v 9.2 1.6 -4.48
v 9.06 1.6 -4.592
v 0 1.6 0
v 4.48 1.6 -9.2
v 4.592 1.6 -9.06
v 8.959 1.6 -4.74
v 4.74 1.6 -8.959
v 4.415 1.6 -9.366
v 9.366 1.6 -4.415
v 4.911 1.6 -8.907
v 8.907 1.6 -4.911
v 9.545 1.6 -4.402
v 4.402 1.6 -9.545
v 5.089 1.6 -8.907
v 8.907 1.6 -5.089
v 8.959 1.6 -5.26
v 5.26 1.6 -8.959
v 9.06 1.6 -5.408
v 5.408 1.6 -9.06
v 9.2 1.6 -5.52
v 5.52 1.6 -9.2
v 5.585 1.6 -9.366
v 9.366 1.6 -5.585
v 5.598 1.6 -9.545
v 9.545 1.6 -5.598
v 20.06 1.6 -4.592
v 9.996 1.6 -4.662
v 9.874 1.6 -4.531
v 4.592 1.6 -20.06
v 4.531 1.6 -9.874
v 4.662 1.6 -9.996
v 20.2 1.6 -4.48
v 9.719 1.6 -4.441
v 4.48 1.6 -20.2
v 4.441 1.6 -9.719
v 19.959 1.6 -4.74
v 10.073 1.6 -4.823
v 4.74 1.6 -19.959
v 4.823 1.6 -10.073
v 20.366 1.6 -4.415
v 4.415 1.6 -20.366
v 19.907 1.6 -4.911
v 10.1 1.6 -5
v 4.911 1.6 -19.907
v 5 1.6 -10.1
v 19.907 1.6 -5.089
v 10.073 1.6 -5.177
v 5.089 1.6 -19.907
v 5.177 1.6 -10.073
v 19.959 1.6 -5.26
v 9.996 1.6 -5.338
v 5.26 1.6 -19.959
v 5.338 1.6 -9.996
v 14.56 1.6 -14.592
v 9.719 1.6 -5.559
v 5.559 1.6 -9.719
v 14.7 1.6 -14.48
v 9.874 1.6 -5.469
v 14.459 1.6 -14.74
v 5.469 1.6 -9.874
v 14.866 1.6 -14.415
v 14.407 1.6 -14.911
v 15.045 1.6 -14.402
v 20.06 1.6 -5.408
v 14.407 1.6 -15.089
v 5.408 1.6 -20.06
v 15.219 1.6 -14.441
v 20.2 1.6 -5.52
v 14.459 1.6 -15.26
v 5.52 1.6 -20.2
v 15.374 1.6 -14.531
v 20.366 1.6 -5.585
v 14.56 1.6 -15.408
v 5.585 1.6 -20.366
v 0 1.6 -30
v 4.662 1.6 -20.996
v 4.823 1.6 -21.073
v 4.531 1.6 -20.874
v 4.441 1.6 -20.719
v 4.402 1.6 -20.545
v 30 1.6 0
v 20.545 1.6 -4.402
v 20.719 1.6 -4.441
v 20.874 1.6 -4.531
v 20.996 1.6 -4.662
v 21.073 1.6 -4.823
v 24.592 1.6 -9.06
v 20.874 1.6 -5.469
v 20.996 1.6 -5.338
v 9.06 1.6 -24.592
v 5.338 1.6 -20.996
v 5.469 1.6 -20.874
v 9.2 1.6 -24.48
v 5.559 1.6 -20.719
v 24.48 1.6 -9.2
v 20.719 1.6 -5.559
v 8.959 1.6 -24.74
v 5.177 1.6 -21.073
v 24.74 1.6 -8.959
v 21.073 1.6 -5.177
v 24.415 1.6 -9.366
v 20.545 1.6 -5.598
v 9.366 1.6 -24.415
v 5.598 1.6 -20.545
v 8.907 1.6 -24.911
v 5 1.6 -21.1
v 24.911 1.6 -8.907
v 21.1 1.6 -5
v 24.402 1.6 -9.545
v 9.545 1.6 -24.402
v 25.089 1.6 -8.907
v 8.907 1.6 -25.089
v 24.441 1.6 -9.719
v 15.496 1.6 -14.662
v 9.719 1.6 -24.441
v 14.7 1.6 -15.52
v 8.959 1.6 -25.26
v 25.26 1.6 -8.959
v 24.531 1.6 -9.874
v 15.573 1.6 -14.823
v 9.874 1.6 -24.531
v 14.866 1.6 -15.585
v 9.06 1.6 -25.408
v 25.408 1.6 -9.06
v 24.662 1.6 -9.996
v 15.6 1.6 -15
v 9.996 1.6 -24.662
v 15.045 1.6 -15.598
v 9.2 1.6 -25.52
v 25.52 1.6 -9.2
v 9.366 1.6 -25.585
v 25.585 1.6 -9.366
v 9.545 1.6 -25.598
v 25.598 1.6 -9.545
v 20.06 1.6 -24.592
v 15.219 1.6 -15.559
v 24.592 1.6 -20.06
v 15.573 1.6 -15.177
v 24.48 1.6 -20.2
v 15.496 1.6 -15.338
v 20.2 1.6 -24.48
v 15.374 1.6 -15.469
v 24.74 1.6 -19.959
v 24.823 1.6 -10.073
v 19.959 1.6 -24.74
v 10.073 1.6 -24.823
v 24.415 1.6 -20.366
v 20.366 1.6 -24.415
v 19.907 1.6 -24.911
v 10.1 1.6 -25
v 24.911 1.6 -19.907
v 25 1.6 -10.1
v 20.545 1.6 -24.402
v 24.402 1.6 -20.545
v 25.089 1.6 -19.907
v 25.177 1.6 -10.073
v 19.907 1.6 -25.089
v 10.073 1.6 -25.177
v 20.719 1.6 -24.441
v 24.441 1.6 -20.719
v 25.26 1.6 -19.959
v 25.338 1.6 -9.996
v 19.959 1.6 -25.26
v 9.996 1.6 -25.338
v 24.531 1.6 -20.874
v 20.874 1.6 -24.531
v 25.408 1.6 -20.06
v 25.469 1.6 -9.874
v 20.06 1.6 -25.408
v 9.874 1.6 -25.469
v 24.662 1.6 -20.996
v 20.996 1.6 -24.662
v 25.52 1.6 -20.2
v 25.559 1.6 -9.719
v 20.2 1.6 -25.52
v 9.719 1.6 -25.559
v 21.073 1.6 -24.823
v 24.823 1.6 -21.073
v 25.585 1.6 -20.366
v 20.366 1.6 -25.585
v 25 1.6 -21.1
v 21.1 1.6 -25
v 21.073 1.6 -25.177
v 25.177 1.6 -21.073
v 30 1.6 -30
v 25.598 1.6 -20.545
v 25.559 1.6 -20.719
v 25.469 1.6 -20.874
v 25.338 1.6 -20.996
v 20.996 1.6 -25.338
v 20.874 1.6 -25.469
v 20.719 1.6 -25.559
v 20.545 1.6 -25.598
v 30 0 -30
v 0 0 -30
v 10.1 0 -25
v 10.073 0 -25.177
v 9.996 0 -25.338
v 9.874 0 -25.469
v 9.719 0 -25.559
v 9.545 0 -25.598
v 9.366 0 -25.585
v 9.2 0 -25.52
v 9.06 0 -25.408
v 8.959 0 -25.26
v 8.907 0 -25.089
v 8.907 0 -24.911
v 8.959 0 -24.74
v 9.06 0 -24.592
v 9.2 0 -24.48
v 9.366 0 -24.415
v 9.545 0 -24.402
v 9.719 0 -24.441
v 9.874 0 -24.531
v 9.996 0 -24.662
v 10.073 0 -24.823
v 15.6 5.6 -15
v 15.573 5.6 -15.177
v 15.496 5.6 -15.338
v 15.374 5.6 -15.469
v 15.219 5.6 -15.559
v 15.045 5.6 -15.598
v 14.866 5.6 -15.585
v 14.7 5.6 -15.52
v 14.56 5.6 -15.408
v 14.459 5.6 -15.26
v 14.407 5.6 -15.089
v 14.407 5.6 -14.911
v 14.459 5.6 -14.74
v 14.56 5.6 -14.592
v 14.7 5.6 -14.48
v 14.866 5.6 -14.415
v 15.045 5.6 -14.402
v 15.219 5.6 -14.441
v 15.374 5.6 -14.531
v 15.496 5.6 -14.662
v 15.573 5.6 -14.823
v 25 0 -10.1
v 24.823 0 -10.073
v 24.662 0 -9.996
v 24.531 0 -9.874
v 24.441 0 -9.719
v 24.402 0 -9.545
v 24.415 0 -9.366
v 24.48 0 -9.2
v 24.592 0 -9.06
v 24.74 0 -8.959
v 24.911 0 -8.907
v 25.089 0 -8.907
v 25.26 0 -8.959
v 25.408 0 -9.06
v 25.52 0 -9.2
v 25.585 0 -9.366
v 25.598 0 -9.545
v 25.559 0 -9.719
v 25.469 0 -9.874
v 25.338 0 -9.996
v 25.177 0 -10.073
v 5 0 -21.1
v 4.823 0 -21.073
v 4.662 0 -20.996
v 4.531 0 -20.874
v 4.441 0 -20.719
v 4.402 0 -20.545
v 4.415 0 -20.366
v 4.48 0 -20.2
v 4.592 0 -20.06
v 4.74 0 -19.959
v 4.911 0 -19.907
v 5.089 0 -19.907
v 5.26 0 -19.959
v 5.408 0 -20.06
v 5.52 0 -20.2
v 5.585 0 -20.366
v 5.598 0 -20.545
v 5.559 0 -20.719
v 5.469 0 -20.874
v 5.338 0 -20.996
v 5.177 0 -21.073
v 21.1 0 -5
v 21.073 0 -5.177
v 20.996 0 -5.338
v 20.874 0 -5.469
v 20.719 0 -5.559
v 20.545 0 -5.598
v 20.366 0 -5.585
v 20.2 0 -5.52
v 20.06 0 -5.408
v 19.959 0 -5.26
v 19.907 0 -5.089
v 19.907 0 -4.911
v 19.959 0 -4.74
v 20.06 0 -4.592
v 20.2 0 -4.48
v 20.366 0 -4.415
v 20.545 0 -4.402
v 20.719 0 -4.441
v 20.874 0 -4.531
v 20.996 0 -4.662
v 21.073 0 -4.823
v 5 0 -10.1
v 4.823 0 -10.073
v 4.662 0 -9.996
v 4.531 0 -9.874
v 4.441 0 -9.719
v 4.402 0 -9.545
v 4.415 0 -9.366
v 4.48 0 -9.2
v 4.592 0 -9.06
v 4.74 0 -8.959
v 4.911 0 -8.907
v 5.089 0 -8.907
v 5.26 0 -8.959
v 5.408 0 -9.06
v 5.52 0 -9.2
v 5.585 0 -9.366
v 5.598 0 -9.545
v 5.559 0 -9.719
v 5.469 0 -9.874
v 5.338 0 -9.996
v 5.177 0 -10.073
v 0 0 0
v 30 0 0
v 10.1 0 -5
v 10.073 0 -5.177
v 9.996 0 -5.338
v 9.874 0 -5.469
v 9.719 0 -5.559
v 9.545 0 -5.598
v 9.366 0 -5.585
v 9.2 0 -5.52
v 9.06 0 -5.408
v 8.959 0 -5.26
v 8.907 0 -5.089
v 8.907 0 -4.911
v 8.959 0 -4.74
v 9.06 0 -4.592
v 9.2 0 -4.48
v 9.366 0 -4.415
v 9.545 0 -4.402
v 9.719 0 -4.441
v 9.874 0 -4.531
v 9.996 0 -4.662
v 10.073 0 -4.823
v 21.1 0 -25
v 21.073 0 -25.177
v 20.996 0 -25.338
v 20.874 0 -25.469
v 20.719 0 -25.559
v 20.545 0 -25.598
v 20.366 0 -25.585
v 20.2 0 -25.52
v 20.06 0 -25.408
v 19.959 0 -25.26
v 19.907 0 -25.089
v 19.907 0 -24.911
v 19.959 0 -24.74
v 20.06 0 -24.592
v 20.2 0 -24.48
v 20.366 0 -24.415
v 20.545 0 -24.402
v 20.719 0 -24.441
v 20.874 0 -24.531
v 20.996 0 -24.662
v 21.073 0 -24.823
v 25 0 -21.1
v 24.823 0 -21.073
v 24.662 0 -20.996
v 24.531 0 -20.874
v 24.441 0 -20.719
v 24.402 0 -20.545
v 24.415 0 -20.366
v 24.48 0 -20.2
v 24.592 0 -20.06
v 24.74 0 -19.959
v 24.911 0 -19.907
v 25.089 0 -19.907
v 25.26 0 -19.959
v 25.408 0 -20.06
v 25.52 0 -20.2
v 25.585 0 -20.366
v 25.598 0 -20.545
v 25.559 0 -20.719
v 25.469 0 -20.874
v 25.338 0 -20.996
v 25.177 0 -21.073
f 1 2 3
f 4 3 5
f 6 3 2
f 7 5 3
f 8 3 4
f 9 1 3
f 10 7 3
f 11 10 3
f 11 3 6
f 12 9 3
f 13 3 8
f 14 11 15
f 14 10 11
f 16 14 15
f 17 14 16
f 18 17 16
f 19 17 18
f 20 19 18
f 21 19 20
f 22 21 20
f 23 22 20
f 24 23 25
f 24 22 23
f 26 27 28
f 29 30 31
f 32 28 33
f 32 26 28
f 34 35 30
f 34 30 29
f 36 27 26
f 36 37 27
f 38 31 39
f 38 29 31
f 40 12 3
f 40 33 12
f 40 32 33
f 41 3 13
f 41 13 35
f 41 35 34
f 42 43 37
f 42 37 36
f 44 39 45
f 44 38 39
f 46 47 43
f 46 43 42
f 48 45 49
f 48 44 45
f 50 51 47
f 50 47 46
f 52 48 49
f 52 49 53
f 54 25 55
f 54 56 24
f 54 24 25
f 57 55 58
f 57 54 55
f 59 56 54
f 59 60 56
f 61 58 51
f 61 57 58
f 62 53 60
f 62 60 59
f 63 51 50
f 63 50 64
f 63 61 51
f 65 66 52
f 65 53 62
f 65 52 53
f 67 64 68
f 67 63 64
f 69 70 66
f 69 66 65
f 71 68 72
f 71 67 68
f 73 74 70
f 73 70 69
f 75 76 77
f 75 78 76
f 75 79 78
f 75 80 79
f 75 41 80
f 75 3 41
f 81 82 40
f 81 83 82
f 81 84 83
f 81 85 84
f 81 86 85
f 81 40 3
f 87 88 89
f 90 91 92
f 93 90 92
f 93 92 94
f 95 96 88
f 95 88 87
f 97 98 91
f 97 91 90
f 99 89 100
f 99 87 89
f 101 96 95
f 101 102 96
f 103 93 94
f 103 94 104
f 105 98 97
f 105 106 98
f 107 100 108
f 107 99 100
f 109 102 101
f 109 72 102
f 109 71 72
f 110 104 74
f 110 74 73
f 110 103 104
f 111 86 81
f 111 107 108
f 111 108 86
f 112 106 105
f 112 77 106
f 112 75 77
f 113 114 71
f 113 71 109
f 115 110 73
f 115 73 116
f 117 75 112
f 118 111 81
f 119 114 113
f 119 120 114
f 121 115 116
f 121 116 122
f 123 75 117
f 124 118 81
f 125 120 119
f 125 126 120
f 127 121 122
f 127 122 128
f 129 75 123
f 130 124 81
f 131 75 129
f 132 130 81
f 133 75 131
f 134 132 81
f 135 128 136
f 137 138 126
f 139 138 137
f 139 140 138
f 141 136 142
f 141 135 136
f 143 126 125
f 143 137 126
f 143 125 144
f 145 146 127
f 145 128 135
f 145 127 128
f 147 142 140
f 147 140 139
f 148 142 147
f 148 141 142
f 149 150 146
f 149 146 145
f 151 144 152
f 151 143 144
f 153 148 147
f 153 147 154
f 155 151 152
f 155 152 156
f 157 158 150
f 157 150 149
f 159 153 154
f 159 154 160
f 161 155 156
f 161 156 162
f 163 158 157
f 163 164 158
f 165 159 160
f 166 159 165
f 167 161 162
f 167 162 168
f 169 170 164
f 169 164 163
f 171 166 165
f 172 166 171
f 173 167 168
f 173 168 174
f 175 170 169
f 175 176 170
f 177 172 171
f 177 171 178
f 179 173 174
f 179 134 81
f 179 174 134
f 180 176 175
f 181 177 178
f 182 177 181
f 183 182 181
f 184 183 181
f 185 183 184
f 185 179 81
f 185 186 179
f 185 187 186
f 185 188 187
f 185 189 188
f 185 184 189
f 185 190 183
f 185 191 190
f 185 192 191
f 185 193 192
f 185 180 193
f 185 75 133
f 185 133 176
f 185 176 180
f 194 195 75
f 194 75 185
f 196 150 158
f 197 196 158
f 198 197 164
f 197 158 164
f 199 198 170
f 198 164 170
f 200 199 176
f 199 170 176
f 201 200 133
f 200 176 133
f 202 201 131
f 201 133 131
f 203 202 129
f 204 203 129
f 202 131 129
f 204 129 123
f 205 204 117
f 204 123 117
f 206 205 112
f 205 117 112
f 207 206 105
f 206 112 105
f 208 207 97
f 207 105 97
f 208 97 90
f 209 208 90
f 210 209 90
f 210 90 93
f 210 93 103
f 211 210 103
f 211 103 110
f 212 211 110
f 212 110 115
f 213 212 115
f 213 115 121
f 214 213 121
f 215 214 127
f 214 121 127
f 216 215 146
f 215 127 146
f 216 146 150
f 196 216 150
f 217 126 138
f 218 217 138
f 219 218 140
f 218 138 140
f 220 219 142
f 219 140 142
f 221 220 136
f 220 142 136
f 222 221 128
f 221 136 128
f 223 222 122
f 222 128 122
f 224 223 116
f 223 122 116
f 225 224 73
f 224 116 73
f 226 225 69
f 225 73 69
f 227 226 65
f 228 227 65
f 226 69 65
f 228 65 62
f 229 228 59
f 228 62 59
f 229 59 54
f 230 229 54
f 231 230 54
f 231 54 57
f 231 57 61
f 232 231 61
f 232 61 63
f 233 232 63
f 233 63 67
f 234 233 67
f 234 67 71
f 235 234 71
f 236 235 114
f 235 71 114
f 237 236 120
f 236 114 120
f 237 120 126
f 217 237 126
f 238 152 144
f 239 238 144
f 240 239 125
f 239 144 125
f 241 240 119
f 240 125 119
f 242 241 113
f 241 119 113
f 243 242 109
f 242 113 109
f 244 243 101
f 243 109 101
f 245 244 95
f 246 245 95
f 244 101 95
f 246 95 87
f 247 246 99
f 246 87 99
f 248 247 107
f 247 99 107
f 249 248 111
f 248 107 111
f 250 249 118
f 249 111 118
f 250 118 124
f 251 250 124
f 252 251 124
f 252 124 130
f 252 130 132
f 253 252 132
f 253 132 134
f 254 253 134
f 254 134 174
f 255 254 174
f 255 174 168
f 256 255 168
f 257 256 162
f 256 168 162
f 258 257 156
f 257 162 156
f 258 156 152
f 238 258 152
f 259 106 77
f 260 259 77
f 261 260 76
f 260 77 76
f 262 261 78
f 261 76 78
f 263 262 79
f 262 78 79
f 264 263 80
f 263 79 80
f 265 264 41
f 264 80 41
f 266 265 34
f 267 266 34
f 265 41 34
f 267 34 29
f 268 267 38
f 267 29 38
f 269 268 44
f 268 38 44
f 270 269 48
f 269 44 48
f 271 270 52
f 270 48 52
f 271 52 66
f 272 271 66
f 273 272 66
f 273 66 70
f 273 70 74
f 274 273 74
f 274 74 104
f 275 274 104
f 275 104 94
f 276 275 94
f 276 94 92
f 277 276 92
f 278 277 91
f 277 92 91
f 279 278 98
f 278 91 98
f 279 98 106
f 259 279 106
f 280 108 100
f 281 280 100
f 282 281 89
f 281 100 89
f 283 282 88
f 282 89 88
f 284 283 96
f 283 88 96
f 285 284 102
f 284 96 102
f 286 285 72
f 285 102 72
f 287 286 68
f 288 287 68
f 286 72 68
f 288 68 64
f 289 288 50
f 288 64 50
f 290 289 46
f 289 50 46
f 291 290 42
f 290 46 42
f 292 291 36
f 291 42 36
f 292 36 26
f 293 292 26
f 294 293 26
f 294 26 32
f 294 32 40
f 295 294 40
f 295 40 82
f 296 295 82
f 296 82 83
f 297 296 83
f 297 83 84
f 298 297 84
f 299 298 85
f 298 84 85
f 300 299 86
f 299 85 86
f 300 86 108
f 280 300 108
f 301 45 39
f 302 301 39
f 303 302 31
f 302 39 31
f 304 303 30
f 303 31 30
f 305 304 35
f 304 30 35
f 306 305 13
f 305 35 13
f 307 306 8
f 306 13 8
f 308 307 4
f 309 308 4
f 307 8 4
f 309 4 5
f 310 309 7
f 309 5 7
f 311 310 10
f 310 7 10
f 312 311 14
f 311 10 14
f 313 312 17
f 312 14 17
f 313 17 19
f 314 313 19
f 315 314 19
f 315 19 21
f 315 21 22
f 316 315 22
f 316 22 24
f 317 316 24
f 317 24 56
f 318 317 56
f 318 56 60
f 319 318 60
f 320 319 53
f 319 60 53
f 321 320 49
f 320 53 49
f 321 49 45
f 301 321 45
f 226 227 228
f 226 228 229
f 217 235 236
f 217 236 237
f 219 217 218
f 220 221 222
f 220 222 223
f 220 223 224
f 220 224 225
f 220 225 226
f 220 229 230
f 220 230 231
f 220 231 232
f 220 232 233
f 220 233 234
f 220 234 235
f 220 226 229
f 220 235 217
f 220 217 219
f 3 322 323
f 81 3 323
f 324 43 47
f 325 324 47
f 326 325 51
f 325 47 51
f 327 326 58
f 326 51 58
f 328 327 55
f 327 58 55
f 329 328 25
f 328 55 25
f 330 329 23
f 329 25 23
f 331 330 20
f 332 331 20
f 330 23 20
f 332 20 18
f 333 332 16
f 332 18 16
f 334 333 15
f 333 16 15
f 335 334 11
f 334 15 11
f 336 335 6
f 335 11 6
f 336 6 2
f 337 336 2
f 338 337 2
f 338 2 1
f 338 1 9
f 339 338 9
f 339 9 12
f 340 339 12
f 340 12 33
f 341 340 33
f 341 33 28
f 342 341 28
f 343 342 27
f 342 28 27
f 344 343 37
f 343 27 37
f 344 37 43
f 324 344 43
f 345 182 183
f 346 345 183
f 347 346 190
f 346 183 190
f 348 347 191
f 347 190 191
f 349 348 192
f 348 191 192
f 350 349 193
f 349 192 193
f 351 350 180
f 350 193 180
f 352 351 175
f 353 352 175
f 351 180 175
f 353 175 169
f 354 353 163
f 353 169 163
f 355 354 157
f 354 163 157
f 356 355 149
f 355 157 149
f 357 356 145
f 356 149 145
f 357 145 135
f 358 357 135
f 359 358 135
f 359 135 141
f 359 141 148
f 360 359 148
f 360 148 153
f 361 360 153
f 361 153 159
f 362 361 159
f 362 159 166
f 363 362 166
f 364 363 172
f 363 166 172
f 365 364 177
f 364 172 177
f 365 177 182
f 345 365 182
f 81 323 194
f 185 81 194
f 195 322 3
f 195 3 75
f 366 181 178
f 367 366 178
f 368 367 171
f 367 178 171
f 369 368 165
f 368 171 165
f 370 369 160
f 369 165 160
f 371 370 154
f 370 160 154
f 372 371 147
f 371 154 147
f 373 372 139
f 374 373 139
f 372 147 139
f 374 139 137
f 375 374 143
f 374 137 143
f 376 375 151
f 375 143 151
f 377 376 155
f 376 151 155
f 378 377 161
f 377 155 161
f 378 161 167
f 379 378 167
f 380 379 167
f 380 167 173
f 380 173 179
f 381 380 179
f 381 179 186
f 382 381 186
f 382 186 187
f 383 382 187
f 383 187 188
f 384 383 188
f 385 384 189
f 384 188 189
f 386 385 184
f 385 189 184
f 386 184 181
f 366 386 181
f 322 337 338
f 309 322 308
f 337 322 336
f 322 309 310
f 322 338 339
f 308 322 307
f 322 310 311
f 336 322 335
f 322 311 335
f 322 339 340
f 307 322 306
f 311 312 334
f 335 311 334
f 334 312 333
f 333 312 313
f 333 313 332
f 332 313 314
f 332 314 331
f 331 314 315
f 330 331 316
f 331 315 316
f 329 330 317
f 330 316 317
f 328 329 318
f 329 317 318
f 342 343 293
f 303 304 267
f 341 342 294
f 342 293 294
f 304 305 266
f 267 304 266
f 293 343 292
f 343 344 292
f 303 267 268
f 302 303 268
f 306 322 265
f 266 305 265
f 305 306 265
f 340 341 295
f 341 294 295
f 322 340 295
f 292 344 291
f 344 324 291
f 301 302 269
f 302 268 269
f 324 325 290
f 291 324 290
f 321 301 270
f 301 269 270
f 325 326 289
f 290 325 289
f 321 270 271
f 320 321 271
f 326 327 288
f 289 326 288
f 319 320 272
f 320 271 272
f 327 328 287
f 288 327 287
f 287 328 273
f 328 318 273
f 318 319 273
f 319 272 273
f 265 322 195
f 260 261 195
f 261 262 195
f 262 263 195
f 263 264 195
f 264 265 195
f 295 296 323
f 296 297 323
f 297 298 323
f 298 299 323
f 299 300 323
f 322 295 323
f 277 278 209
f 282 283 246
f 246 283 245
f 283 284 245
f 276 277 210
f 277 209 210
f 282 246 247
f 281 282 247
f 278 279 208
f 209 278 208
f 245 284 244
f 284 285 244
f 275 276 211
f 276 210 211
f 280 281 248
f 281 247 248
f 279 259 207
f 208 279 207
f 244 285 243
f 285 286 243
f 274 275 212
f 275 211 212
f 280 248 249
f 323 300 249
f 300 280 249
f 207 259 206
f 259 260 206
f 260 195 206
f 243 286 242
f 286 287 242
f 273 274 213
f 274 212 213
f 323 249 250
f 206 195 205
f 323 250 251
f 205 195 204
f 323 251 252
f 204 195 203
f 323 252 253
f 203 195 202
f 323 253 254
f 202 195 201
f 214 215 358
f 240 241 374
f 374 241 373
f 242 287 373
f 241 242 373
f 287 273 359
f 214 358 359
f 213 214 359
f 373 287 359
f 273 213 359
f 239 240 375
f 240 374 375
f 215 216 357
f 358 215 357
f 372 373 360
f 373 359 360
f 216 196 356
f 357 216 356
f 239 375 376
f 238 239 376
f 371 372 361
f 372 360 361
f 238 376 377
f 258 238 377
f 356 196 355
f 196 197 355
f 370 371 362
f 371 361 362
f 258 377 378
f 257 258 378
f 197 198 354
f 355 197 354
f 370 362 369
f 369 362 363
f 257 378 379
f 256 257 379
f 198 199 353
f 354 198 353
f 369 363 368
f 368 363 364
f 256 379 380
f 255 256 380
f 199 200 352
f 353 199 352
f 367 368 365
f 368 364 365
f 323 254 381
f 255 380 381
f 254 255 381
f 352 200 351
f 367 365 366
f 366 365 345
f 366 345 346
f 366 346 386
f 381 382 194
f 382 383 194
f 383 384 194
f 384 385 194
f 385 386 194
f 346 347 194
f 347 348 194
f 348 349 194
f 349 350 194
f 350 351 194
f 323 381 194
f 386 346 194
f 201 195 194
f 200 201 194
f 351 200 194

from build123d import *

# Parameters (mm, degrees)
SKETCH1_W           = 30
SKETCH1_H           = 30
BOSS_EXTRUDE1_DEPTH = 1.6
SKETCH2_R           = 0.6
CUT_EXTRUDE1_DEPTH  = 1.6
CIRPATTERN1_COUNT   = 2
CIRPATTERN1_ANGLE   = 90
SKETCH4_R           = 0.6
BOSS_EXTRUDE2_DEPTH = 4


with BuildPart() as part:
    # Sketch1 → Boss-Extrude1 (new body)
    with BuildSketch(Plane(origin=(0, 0, 0), x_dir=(1, 0, 0), z_dir=(0, 1, 0))):
        with Locations((15, 15)):
            Rectangle(SKETCH1_W, SKETCH1_H)
    extrude(amount=BOSS_EXTRUDE1_DEPTH)

    # Sketch2 → Cut-Extrude1 (cut)
    with BuildSketch(Plane(origin=(0, 1.6, 0), x_dir=(1, 0, 0), z_dir=(0, 1, 0))):
        with Locations((20.5, 5)):
            Circle(SKETCH2_R)
        with Locations((9.5, 5)):
            Circle(SKETCH2_R)
        with Locations((20.5, 25)):
            Circle(SKETCH2_R)
        with Locations((9.5, 25)):
            Circle(SKETCH2_R)
    cut_extrude1 = extrude(amount=-CUT_EXTRUDE1_DEPTH, mode=Mode.SUBTRACT)

    # CirPattern1: Cut-Extrude1 ×2 about axis
    cirpattern1_axis = Axis((15, 0, -15), (0, 1, 0))
    for i in range(1, CIRPATTERN1_COUNT):
        add(cut_extrude1.rotate(cirpattern1_axis, i * CIRPATTERN1_ANGLE / (CIRPATTERN1_COUNT - 1)), mode=Mode.SUBTRACT)

    # Sketch4 → Boss-Extrude2 (add)
    with BuildSketch(Plane(origin=(0, 1.6, 0), x_dir=(1, 0, 0), z_dir=(0, 1, 0))):
        with Locations((15, 15)):
            Circle(SKETCH4_R)
    extrude(amount=BOSS_EXTRUDE2_DEPTH)


solid = part.part
